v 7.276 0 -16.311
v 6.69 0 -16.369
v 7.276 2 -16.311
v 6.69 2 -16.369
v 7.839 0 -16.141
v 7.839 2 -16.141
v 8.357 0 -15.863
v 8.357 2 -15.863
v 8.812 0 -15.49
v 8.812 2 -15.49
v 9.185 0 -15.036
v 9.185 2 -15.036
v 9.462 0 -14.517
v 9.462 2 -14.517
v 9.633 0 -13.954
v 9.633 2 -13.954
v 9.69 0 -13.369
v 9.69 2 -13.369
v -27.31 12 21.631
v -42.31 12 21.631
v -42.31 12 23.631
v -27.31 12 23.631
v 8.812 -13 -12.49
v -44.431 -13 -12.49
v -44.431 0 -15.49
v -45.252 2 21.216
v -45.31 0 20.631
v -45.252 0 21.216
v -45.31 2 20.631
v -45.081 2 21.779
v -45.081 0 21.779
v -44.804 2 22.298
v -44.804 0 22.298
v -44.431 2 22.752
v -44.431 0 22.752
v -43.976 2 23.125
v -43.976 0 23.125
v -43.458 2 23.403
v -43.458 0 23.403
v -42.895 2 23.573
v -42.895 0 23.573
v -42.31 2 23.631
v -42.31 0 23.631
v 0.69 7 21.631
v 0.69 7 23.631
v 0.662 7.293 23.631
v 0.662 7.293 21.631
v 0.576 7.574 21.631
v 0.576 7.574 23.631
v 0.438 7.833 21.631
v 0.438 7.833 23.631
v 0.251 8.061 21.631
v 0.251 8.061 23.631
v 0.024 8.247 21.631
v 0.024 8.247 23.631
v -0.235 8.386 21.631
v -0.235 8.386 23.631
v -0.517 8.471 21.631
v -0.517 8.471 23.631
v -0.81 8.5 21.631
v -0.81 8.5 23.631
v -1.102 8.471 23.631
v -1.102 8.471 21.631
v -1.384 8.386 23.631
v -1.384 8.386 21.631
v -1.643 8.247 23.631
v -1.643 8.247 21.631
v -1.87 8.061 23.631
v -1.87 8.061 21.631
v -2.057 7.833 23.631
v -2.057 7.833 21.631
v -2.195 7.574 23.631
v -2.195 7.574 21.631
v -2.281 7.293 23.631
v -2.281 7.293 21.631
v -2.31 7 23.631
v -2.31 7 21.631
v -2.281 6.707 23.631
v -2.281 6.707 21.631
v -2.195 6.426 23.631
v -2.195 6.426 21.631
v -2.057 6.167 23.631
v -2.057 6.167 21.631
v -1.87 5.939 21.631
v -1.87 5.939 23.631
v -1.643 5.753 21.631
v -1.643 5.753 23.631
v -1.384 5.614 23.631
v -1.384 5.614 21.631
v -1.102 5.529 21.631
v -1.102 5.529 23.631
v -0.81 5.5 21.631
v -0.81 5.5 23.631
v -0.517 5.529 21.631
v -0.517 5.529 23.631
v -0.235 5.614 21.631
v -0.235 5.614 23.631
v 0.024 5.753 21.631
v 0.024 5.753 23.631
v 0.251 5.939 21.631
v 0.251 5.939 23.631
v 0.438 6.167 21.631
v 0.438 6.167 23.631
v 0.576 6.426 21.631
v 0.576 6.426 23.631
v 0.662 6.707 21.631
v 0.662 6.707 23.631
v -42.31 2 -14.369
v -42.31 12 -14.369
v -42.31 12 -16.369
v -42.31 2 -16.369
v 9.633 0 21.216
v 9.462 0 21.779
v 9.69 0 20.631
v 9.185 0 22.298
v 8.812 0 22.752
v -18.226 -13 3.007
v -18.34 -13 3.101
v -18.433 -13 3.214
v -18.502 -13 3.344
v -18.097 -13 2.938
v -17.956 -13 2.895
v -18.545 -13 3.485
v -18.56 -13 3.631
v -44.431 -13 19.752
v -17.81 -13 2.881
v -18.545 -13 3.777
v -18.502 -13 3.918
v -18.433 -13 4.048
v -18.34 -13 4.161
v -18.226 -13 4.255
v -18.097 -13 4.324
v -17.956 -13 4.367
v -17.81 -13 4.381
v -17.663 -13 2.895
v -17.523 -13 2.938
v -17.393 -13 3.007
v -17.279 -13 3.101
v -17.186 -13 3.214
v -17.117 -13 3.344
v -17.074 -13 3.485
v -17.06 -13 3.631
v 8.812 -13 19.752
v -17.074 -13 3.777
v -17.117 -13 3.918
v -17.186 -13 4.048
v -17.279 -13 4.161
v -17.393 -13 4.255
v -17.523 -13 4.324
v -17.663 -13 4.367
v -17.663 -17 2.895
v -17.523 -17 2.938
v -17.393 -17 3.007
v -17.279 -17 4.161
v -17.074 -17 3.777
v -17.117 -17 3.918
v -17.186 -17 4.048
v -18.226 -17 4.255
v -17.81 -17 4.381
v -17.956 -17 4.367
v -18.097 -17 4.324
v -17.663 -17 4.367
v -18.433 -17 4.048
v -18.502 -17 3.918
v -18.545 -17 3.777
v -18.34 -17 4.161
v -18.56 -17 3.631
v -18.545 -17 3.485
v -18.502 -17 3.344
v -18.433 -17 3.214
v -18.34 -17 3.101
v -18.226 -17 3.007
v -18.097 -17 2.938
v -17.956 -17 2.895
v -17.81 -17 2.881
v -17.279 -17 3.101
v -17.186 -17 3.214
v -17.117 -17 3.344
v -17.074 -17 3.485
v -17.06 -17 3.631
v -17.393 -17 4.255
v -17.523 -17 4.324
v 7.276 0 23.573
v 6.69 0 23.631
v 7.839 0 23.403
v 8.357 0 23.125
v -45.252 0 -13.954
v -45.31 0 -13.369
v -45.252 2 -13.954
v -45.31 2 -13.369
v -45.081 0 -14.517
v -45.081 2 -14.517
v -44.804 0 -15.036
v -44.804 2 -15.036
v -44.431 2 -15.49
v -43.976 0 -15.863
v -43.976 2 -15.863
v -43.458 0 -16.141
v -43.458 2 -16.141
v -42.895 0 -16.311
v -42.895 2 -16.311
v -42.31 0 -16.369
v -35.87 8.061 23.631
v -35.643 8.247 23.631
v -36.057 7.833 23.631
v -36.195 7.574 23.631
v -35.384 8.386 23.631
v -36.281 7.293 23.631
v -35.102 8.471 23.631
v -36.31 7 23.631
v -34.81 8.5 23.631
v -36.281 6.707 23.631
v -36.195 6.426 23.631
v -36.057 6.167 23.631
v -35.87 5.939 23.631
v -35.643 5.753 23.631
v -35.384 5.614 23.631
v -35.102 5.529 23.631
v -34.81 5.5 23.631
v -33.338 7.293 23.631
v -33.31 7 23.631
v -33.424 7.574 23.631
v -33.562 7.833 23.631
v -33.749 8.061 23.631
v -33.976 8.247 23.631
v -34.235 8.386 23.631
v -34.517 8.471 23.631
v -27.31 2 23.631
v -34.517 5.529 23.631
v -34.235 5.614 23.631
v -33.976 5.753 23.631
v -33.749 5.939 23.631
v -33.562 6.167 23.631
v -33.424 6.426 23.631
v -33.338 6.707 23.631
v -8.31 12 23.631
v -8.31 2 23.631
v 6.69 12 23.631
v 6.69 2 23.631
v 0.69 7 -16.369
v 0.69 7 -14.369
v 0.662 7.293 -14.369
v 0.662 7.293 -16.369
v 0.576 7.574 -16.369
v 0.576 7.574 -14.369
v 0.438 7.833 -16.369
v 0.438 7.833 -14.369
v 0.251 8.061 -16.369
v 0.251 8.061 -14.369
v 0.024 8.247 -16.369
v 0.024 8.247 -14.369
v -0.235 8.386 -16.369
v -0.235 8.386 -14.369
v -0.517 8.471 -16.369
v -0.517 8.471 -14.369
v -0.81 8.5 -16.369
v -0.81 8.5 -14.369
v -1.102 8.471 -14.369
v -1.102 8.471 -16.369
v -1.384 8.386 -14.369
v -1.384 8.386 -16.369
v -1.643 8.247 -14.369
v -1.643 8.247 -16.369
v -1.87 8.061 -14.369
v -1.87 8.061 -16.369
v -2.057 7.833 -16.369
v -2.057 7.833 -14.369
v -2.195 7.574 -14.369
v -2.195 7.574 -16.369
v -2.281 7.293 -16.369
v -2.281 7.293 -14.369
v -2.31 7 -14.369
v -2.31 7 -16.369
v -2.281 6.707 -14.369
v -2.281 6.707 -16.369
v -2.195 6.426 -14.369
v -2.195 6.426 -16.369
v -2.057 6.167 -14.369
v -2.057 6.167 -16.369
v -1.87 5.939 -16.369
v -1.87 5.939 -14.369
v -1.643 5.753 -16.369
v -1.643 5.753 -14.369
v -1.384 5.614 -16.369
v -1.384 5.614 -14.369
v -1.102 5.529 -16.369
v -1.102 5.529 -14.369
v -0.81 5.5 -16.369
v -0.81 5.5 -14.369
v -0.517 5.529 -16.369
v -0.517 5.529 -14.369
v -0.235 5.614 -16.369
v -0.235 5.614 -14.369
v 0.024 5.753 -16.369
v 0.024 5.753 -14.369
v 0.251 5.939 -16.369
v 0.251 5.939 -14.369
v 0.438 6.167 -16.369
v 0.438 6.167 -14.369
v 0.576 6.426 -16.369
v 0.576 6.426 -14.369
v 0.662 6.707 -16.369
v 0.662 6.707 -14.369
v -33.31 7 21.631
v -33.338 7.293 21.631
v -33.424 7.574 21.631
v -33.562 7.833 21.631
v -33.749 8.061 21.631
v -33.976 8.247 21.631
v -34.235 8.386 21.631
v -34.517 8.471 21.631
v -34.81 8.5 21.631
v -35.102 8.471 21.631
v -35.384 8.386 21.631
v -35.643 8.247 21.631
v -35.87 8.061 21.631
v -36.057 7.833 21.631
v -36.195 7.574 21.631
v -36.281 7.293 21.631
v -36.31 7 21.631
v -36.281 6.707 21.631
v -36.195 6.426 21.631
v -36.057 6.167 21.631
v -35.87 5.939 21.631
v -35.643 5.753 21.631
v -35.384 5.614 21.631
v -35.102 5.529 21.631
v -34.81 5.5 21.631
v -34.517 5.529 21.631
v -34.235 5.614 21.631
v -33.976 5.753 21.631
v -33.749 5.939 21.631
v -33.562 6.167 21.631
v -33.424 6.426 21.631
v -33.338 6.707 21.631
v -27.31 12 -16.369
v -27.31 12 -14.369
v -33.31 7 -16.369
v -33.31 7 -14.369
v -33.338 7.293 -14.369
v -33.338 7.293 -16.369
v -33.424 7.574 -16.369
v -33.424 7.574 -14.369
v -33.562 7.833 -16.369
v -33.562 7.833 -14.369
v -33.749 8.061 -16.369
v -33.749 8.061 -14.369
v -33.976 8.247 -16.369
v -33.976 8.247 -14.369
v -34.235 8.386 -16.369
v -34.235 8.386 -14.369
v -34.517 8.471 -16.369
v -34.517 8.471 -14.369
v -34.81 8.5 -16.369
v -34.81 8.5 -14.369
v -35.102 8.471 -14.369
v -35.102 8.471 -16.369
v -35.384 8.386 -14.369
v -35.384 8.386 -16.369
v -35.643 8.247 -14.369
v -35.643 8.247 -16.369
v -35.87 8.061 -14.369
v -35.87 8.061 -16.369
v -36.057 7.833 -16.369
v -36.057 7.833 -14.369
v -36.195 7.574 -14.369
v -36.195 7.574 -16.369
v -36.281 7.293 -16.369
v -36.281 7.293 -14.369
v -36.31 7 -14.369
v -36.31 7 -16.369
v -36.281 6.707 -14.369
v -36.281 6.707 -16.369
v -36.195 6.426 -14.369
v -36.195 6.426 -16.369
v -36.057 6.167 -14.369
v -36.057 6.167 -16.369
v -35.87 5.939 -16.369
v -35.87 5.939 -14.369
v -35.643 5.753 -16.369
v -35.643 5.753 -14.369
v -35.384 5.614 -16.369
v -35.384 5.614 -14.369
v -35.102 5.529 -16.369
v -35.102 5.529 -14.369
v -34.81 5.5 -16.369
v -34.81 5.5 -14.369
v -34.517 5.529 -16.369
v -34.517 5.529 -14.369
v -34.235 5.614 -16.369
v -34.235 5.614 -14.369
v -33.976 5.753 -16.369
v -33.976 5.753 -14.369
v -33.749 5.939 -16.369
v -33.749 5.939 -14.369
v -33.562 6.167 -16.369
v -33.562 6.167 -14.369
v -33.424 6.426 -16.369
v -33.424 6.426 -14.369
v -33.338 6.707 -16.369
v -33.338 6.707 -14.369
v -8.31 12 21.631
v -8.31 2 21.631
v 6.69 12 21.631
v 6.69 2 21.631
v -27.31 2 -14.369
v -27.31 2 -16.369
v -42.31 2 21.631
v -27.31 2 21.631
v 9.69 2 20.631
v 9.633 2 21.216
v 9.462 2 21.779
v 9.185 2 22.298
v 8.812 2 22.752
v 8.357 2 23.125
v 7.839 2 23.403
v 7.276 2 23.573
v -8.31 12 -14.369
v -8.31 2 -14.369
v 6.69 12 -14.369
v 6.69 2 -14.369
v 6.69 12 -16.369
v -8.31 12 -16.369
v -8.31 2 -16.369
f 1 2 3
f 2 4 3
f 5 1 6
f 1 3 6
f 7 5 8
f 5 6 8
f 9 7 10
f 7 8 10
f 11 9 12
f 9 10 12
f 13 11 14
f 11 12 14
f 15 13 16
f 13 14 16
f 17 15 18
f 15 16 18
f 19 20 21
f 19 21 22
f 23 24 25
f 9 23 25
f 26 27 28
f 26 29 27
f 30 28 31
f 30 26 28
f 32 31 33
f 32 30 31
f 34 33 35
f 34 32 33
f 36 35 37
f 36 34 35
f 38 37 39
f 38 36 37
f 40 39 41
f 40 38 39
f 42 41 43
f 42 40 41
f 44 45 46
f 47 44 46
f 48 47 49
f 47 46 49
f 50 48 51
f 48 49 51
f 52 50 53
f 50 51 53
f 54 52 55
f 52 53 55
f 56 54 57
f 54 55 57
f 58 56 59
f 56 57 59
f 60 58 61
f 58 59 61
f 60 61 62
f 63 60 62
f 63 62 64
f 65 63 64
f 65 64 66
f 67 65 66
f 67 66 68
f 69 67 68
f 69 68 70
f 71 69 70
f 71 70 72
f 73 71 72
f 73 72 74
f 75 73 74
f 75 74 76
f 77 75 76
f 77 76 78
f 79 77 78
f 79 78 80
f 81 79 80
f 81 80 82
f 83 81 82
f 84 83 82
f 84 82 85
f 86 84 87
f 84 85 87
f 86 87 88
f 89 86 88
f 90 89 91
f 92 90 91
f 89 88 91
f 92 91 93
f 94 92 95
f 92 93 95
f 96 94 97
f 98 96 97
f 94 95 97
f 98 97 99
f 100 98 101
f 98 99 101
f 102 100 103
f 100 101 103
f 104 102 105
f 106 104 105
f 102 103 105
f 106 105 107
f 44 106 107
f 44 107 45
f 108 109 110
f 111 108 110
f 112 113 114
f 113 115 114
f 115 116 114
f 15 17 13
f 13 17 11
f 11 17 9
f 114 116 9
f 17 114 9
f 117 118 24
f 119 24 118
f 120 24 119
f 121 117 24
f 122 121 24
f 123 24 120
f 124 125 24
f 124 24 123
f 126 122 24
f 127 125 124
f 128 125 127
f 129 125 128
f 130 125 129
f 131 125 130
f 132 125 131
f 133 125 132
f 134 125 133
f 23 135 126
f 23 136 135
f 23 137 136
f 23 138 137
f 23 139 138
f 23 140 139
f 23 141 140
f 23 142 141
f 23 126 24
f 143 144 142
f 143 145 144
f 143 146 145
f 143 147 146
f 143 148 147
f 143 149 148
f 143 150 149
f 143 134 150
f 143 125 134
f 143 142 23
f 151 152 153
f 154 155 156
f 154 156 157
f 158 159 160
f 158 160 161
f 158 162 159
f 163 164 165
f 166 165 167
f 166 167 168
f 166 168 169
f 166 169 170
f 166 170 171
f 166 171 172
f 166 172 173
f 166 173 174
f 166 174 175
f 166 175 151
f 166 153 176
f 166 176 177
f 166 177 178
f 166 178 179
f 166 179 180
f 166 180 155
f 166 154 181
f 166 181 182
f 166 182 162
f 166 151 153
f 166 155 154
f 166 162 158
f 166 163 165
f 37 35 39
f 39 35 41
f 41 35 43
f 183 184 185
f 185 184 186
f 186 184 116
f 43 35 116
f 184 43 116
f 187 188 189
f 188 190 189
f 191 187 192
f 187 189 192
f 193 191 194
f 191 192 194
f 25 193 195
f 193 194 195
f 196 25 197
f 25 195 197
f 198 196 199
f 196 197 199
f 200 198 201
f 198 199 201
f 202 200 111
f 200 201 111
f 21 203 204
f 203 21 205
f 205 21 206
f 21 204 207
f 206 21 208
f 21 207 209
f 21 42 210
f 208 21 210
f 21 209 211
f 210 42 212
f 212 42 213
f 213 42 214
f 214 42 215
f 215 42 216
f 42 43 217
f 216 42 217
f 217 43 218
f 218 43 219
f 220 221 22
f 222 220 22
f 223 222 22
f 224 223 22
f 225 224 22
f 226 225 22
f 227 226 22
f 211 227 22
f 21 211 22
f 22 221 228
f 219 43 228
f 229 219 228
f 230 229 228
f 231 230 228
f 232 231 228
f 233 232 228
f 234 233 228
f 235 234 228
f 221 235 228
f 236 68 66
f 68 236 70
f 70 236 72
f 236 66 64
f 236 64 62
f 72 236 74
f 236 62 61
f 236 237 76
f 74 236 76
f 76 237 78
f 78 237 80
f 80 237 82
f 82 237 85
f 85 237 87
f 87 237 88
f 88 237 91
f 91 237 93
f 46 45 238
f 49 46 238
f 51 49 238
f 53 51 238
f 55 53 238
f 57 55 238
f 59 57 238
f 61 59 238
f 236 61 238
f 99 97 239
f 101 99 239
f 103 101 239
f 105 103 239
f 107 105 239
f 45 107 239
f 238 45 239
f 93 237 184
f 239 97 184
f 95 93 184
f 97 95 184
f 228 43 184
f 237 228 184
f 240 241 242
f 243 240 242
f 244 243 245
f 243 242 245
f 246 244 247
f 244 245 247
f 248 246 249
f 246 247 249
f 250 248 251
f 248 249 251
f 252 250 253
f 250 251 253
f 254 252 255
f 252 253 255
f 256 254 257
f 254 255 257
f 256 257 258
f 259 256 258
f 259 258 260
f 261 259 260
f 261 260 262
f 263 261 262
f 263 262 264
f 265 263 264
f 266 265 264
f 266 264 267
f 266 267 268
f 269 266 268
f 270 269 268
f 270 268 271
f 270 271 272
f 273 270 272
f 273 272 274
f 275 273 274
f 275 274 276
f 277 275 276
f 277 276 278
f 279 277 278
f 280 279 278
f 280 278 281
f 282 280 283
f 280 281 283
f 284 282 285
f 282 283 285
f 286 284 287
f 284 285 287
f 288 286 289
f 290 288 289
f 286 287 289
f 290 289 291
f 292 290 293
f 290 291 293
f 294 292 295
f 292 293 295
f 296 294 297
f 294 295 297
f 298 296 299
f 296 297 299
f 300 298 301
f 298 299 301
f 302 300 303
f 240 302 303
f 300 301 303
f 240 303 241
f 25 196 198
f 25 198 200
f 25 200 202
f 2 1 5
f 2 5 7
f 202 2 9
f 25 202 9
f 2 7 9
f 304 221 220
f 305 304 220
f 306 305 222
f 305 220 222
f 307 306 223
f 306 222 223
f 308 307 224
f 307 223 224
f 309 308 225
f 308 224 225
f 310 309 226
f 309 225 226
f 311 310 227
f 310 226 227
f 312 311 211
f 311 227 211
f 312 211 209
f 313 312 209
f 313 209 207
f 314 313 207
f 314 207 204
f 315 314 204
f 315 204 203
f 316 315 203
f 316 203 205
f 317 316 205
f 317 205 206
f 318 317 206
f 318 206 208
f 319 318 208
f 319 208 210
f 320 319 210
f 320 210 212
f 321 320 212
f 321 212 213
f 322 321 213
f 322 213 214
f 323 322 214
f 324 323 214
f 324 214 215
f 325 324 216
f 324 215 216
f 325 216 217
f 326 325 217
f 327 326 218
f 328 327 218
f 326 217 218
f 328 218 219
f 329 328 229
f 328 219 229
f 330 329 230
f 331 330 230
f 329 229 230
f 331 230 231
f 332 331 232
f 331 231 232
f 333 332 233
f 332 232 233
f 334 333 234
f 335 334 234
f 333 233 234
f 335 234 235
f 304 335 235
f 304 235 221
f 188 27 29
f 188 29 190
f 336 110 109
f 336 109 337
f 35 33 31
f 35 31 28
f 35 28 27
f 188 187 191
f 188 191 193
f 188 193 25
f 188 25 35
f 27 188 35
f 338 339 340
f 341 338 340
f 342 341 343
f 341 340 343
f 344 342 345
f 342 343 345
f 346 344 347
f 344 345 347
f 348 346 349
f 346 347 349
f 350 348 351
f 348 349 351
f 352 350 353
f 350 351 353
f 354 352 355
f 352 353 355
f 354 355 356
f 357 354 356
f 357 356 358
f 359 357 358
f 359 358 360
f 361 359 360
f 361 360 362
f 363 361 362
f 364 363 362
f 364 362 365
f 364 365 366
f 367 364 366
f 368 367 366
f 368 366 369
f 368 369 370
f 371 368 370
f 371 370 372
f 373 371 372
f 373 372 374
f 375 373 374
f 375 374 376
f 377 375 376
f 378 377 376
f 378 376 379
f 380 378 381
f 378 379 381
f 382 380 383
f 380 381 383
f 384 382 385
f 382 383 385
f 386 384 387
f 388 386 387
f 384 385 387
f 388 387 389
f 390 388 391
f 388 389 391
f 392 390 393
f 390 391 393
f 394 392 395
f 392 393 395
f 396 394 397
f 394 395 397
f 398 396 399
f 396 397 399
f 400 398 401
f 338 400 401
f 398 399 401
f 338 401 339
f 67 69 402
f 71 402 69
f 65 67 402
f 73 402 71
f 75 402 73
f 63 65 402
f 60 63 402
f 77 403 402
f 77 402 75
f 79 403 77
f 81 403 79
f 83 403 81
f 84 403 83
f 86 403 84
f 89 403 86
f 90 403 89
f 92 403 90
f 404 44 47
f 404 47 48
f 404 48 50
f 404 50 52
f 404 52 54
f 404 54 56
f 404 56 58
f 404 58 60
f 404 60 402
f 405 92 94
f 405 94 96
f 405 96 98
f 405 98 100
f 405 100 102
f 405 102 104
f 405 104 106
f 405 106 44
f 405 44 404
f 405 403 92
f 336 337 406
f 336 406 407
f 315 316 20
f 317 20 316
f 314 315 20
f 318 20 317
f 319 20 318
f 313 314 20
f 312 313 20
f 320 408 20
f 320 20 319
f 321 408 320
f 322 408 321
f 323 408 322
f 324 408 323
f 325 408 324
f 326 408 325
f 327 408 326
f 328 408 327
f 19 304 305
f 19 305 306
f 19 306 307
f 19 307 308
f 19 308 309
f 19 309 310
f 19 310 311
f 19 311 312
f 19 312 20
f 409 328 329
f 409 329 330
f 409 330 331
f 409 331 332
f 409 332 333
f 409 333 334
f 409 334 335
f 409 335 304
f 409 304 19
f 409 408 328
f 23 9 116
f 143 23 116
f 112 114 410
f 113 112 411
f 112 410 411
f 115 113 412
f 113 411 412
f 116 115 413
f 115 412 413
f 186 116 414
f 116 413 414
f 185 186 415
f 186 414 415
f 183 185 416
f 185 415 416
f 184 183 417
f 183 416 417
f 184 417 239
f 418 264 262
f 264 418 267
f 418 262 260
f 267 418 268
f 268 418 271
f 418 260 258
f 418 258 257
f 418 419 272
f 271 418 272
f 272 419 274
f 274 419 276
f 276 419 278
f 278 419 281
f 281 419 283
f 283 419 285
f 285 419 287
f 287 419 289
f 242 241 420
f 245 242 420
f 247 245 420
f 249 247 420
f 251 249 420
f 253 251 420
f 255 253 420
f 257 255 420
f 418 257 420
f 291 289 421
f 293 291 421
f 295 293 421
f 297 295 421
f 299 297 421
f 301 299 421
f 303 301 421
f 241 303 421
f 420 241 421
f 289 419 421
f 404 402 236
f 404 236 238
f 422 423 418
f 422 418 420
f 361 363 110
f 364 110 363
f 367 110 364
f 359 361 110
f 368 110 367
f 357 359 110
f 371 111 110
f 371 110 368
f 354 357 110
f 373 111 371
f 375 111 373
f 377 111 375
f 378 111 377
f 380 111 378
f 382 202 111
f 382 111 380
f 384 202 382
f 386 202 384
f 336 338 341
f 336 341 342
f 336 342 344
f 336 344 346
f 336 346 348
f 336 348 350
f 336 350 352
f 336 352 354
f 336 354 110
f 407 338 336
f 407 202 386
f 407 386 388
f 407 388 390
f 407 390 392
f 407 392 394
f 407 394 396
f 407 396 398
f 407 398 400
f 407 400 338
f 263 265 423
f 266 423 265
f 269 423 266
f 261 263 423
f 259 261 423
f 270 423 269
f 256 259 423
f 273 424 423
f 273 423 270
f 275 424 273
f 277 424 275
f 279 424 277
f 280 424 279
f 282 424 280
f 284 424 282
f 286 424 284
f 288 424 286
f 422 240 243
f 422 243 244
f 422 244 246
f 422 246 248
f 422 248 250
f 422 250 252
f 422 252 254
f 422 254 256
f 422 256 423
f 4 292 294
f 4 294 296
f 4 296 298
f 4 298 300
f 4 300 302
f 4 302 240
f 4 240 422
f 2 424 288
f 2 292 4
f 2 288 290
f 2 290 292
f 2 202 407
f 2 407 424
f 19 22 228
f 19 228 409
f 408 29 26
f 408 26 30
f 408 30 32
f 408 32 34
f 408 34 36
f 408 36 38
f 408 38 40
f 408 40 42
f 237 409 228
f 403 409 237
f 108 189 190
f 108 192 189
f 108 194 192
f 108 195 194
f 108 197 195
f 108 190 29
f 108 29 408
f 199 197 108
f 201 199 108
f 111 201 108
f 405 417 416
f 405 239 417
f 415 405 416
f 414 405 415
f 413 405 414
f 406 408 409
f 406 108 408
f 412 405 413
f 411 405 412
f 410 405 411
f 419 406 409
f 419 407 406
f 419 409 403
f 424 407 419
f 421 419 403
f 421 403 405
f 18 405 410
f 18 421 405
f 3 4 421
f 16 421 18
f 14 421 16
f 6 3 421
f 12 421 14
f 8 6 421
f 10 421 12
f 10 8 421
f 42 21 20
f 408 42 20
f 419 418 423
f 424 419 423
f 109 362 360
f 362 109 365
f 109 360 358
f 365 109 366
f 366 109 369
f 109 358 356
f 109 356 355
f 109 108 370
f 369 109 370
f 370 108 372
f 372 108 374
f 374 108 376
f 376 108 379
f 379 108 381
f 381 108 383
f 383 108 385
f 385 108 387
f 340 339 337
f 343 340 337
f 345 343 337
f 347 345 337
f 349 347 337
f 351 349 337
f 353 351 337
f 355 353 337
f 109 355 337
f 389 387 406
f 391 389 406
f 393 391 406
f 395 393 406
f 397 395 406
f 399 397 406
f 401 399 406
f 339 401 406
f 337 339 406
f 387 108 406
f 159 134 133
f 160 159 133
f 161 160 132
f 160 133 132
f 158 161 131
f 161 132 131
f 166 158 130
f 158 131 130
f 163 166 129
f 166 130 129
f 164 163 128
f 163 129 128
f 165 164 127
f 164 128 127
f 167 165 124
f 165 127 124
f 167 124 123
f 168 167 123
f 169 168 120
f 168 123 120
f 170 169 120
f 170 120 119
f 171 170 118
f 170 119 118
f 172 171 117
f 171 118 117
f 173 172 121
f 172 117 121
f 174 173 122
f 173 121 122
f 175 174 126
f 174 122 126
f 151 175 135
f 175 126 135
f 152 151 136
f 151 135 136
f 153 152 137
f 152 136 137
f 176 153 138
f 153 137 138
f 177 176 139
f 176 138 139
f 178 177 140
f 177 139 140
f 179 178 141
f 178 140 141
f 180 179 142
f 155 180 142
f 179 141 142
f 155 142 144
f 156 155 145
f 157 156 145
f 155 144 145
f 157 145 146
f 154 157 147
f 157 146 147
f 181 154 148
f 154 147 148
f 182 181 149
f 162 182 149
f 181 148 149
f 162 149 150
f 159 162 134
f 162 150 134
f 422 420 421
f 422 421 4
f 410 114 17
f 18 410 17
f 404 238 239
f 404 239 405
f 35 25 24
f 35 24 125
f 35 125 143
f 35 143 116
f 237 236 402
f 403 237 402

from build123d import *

# Parameters (mm, degrees)
SKETCH1_W           = 55
SKETCH1_H           = 40
BOSS_EXTRUDE1_DEPTH = 2
SKETCH3_W           = 15
SKETCH3_H           = 2
BOSS_EXTRUDE2_DEPTH = 10
FILLET1_R           = 3
FILLET2_R           = 3
FILLET3_R           = 3
FILLET4_R           = 3
SKETCH4_R           = 1.5
CUT_EXTRUDE1_DEPTH  = 50
SKETCH5_W           = 53.242640687
SKETCH5_H           = 38.242640688
BOSS_EXTRUDE3_DEPTH = 13
CUT_EXTRUDE2_DEPTH  = 61.469324671
SKETCH7_R           = 0.75
BOSS_EXTRUDE4_DEPTH = 4


with BuildPart() as part:
    # Sketch1 → Boss-Extrude1 (new body)
    with BuildSketch(Plane(origin=(0, 0, 0), x_dir=(1, 0, 0), z_dir=(0, 1, 0))):
        with Locations((-17.80952381, -3.630952381)):
            Rectangle(SKETCH1_W, SKETCH1_H)
    extrude(amount=BOSS_EXTRUDE1_DEPTH)

    # Sketch3 → Boss-Extrude2 (add)
    with BuildSketch(Plane(origin=(0, 2, 0), x_dir=(1, 0, 0), z_dir=(0, 1, 0))):
        with Locations((-34.80952381, 15.369047619)):
            Rectangle(SKETCH3_W, SKETCH3_H)
        with Locations((-34.80952381, -22.630952381)):
            Rectangle(SKETCH3_W, SKETCH3_H)
        with Locations((-0.80952381, -22.630952381)):
            Rectangle(SKETCH3_W, SKETCH3_H)
        with Locations((-0.80952381, 15.369047619)):
            Rectangle(SKETCH3_W, SKETCH3_H)
    extrude(amount=BOSS_EXTRUDE2_DEPTH)

    # Fillet1
    fillet1_edges = [part.edges().sort_by_distance(p)[0] for p in [
        (-45.30952381, 1, -16.369047619),
    ]]
    fillet(fillet1_edges, radius=FILLET1_R)

    # Fillet2
    fillet2_edges = [part.edges().sort_by_distance(p)[0] for p in [
        (-45.30952381, 1, 23.630952381),
    ]]
    fillet(fillet2_edges, radius=FILLET2_R)

    # Fillet3
    fillet3_edges = [part.edges().sort_by_distance(p)[0] for p in [
        (9.69047619, 1, -16.369047619),
    ]]
    fillet(fillet3_edges, radius=FILLET3_R)

    # Fillet4
    fillet4_edges = [part.edges().sort_by_distance(p)[0] for p in [
        (9.69047619, 1, 23.630952381),
    ]]
    fillet(fillet4_edges, radius=FILLET4_R)

    # Sketch4 → Cut-Extrude1 (cut)
    with BuildSketch(Plane.XY.offset(23.630952381)):
        with Locations((-0.80952381, 7)):
            Circle(SKETCH4_R)
        with Locations((-34.80952381, 7)):
            Circle(SKETCH4_R)
    extrude(amount=-CUT_EXTRUDE1_DEPTH, mode=Mode.SUBTRACT)

    # Sketch5 → Boss-Extrude3 (add)
    with BuildSketch(Plane.XZ):
        with Locations((-17.809523809, 3.630952381)):
            Rectangle(SKETCH5_W, SKETCH5_H)
    extrude(amount=BOSS_EXTRUDE3_DEPTH)

    # Sketch6 → Cut-Extrude2 (cut, through all)
    with BuildSketch(Plane.ZY.offset(44.430844153)):
        Polygon((-15.490367963, -13), (-12.490367963, -13), (-15.490367963, 0), align=None)
        Polygon((19.752272725, -13), (22.752272725, 0), (22.752272725, -13), align=None)
    extrude(amount=-CUT_EXTRUDE2_DEPTH, mode=Mode.SUBTRACT)

    # Sketch7 → Boss-Extrude4 (add)
    with BuildSketch(Plane.XZ.offset(13)):
        with Locations(Location((-17.80952381, 3.630952381, 0), (0, 0, 90))):
            Circle(SKETCH7_R)
    extrude(amount=BOSS_EXTRUDE4_DEPTH)


solid = part.part
